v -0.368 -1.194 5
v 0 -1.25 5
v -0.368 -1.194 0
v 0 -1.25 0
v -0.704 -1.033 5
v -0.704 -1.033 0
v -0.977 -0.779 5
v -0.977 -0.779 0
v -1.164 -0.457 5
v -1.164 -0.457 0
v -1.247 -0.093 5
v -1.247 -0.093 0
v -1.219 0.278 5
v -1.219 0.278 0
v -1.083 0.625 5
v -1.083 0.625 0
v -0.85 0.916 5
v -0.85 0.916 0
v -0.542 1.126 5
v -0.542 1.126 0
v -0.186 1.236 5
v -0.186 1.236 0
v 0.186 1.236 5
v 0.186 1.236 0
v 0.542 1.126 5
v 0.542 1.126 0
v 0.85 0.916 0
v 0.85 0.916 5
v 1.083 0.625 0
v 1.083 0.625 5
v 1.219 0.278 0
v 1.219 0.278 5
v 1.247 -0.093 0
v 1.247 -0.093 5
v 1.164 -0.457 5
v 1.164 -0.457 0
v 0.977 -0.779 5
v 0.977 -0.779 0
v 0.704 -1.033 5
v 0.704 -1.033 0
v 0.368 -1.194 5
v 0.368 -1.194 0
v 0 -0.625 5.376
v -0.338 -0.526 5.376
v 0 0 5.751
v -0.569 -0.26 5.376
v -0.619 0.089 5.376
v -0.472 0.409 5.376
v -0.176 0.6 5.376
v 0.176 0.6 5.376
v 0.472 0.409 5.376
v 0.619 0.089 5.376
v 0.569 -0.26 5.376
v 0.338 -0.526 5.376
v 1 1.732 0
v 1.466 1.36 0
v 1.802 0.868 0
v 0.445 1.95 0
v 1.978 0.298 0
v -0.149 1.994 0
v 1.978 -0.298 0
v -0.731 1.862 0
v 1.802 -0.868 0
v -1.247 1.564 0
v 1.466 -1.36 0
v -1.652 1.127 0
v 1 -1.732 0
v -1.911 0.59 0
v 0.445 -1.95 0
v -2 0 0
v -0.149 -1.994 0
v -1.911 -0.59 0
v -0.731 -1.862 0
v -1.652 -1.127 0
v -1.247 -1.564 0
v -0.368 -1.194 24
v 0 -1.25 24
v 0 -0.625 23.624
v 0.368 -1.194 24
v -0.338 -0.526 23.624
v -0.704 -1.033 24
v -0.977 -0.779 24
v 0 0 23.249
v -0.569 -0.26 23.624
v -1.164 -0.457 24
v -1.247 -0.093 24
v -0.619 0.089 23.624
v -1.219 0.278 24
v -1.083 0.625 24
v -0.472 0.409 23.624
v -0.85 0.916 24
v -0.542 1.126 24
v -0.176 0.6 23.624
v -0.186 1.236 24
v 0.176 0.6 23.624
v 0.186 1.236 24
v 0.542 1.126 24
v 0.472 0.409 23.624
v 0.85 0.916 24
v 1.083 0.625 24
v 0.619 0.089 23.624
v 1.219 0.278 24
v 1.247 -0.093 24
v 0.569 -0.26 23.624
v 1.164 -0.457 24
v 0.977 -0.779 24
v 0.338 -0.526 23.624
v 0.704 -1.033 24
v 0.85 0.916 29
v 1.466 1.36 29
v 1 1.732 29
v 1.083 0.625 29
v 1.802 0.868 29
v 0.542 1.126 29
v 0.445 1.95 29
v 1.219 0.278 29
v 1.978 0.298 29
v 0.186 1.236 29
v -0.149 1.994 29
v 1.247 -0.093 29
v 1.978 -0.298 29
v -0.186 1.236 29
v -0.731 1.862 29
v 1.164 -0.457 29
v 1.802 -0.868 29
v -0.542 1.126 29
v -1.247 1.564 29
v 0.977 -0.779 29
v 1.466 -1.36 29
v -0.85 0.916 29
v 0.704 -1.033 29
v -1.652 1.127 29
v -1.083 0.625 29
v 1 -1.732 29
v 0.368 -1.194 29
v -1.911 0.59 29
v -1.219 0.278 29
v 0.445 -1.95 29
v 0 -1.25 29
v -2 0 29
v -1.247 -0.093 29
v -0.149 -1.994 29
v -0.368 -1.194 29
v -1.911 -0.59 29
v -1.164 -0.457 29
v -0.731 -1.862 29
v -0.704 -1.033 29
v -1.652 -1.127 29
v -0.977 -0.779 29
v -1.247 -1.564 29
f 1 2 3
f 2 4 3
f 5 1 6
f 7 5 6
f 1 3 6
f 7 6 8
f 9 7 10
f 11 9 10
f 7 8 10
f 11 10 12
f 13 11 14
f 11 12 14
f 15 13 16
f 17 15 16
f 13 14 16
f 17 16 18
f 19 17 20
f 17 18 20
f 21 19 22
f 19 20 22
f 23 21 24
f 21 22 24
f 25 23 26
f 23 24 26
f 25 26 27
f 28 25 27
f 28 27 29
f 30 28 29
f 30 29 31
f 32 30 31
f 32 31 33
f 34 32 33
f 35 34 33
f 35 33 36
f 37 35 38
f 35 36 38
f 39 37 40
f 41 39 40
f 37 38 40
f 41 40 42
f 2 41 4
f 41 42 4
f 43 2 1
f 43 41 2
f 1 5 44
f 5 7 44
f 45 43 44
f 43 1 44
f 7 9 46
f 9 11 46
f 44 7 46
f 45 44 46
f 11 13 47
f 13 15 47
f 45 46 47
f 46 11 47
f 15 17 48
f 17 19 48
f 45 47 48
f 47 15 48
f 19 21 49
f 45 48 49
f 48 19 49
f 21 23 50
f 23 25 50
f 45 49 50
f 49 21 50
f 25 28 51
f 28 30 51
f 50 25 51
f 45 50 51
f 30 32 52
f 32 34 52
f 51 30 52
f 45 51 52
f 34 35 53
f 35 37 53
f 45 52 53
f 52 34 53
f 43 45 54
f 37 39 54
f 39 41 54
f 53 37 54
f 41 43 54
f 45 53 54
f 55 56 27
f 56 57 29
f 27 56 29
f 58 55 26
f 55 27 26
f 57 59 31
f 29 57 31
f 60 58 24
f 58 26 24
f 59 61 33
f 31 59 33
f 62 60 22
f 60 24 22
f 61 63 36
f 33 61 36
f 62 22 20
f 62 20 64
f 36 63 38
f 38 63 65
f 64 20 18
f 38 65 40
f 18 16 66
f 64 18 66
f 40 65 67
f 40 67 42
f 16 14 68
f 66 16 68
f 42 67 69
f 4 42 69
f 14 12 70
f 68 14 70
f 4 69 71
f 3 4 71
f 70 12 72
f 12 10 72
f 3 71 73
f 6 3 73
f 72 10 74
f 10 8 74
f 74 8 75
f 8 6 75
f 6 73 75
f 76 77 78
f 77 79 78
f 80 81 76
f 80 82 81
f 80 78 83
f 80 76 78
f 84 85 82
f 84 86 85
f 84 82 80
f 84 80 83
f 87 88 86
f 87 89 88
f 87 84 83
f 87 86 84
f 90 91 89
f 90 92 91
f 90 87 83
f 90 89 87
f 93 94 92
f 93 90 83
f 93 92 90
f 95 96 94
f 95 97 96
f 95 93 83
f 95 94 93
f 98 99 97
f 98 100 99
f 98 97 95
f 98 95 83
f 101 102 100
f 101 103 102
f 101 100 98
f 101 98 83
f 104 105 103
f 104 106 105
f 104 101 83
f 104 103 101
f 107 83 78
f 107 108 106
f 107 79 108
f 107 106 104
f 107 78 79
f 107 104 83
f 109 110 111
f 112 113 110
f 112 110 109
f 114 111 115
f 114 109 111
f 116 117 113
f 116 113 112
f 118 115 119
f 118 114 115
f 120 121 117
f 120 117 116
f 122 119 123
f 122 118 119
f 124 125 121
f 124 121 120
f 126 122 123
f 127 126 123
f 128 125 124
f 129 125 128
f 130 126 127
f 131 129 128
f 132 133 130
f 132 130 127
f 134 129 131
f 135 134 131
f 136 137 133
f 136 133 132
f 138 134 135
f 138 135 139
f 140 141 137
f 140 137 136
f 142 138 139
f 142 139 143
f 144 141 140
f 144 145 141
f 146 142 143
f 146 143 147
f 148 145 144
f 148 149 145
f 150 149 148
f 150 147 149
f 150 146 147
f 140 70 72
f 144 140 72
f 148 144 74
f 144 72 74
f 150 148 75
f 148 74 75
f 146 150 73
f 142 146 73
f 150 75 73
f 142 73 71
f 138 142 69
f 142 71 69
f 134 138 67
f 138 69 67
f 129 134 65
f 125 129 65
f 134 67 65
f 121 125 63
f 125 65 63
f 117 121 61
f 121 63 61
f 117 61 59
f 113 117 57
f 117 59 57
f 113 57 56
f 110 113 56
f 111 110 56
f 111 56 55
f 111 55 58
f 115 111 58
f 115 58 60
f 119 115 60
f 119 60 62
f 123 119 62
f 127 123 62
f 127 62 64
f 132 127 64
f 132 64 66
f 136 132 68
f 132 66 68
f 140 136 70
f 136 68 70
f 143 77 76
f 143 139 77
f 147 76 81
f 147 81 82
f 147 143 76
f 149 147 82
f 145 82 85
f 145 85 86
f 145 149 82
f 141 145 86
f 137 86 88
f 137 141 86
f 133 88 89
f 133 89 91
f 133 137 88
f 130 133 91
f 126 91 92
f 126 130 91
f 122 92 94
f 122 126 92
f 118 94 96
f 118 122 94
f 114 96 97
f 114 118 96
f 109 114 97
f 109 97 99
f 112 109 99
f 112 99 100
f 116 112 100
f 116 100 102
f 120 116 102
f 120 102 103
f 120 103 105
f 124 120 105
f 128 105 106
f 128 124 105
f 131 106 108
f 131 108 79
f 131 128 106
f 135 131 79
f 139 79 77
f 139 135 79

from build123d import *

# Parameters (mm, degrees)
SKETCH1_R           = 2
BOSS_EXTRUDE1_DEPTH = 29


with BuildPart() as part:
    # Sketch1 → Boss-Extrude1 (new body)
    with BuildSketch(Plane.XY):
        with Locations(Location((0, 0, 0), (0, 0, 180))):
            Circle(SKETCH1_R)
    extrude(amount=BOSS_EXTRUDE1_DEPTH)

    # Sketch6 → Tap Drill for M3x0.5 Tap1 (revolve, cut)
    with BuildSketch(Plane(origin=(0, 0, 29), x_dir=(0, -1, 0), z_dir=(1, 0, 0))):
        Polygon((0, 0), (0, 5.751075774), (1.25, 5), (1.25, 0), align=None)
    tap_drill_for_m3x0_5_tap1 = revolve(axis=Axis((0, 0, 35.35), (0, 0, -1)), mode=Mode.SUBTRACT)

    # Mirror2: Tap Drill for M3x0.5 Tap1 across plane
    add(tap_drill_for_m3x0_5_tap1.mirror(Plane(origin=(0, 0, 14.5), x_dir=(1, 0, 0), z_dir=(0, 0, -1))), mode=Mode.SUBTRACT)


solid = part.part
